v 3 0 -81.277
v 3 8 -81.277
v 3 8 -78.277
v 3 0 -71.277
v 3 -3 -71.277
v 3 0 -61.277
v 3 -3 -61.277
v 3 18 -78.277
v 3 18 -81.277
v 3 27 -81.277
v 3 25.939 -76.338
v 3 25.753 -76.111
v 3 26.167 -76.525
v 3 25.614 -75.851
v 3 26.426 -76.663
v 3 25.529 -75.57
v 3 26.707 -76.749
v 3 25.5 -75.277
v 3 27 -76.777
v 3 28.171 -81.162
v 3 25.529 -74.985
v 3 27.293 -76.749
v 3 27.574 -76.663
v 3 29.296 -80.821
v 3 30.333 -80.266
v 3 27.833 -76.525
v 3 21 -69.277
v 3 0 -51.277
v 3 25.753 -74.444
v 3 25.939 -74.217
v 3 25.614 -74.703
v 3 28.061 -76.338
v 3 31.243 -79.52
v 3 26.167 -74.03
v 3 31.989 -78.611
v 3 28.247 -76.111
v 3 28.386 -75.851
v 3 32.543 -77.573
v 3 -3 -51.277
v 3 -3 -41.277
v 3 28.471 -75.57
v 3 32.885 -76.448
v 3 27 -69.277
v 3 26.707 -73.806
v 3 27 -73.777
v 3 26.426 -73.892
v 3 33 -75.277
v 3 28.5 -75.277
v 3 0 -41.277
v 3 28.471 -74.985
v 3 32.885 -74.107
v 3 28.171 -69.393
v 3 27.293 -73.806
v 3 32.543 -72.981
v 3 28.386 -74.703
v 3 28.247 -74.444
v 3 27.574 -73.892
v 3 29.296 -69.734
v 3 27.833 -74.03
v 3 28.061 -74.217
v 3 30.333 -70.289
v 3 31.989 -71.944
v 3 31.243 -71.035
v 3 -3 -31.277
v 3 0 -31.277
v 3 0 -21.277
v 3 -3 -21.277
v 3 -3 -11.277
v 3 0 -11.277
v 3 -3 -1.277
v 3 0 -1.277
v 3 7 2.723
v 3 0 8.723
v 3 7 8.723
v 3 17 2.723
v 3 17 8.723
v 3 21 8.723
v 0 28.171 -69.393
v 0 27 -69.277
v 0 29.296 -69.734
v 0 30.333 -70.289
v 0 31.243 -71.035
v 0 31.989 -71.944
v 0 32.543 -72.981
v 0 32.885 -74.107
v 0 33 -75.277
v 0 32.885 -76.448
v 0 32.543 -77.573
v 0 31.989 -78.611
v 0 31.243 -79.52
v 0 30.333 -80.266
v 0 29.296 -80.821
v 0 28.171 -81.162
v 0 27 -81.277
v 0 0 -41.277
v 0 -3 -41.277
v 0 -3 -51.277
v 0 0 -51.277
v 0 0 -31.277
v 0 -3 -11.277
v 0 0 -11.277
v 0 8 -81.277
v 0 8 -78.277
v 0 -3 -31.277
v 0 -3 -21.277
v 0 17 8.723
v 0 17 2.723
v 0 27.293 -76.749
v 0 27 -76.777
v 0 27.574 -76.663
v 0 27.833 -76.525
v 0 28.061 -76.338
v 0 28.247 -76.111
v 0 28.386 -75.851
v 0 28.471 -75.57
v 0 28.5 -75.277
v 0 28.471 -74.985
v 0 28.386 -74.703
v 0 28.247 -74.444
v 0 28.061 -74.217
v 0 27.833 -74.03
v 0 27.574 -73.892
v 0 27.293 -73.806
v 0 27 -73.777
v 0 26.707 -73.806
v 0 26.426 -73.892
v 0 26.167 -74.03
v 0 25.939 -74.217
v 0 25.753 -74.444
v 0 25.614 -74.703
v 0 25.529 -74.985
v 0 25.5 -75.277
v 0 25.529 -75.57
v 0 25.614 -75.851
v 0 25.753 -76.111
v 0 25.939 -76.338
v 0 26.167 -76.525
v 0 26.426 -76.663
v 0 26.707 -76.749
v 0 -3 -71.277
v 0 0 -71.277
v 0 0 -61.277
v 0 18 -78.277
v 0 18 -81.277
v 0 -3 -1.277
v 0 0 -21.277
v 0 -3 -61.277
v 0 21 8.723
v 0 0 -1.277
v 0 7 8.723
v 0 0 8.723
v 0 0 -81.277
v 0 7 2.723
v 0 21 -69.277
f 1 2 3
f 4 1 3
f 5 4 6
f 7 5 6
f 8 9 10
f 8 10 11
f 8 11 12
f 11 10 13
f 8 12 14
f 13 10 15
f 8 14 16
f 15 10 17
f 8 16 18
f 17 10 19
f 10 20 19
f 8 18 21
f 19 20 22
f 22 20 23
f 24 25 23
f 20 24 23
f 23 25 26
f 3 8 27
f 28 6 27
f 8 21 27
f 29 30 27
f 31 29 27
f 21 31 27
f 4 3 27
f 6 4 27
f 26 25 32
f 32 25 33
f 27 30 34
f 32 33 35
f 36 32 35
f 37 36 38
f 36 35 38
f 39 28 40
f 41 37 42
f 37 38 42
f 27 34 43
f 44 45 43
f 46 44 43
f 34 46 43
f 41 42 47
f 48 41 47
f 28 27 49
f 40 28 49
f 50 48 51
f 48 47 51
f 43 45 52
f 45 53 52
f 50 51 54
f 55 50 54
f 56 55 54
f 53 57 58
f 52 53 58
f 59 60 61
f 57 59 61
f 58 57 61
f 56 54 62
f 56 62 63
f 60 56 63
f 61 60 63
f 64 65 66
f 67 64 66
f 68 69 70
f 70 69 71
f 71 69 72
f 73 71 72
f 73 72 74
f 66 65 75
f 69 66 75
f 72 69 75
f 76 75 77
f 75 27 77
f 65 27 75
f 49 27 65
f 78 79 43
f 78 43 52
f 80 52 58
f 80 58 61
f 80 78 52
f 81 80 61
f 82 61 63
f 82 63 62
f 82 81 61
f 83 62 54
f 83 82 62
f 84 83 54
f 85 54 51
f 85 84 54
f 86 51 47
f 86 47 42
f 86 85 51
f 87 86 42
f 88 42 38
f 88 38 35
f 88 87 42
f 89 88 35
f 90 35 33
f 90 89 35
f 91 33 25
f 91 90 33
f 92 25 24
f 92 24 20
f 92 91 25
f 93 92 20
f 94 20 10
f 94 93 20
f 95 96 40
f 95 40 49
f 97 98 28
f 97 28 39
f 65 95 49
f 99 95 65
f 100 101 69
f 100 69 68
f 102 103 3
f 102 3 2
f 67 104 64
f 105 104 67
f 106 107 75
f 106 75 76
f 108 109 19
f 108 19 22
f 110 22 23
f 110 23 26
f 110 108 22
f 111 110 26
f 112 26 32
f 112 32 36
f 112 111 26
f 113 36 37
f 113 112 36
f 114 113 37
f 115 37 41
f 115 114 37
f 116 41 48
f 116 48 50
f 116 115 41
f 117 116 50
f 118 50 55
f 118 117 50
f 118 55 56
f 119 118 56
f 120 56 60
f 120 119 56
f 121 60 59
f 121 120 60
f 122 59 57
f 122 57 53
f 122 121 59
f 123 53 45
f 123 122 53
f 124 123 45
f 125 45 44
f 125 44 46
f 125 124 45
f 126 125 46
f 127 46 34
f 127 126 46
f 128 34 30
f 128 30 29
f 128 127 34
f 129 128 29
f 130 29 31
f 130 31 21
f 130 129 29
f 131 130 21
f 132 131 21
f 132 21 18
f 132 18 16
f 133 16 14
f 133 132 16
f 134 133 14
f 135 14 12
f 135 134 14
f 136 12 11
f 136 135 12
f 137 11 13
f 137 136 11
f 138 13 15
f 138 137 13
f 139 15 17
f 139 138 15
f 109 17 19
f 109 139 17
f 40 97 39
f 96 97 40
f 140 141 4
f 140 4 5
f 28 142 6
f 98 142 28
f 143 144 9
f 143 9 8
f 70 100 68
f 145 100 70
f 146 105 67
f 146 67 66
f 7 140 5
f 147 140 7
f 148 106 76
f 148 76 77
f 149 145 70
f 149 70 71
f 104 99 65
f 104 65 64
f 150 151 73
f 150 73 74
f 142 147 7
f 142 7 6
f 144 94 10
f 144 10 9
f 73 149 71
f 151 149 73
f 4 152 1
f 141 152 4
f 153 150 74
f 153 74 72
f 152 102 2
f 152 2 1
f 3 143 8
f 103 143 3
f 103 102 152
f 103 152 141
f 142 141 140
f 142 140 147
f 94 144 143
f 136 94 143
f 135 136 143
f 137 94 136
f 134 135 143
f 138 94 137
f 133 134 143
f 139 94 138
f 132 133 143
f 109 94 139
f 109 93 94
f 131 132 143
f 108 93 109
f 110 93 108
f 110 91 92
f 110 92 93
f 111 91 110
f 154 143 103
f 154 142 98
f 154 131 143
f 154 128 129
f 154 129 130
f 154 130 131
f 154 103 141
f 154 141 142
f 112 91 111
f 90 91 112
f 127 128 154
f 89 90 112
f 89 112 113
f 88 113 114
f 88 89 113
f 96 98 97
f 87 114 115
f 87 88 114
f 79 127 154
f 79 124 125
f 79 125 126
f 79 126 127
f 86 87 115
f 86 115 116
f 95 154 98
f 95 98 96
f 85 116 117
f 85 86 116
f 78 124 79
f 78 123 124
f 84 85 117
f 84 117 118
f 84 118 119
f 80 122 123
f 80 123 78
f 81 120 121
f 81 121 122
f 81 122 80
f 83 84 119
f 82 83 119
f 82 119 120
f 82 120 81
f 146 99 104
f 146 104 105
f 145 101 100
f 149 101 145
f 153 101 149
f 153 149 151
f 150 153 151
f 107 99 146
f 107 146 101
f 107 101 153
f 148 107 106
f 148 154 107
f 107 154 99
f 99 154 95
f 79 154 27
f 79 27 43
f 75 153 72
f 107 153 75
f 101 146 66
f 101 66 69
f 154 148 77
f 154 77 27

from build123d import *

# Parameters (mm, degrees)
SKETCH1_R           = 1.5
BOSS_EXTRUDE1_DEPTH = 3


with BuildPart() as part:
    # Sketch1 → Boss-Extrude1 (new body)
    with BuildSketch(Plane(origin=(0, 0, 0), x_dir=(0, 0, -1), z_dir=(1, 0, 0))):
        with BuildLine():
            Line((81.277391257, 21), (81.277391257, 18))
            Line((81.277391257, 18), (78.277391257, 18))
            Line((78.277391257, 18), (78.277391257, 8))
            Line((78.277391257, 8), (81.277391257, 8))
            Line((81.277391257, 8), (81.277391257, 0))
            Line((81.277391257, 0), (71.277391257, 0))
            Line((71.277391257, 0), (71.277391257, -3))
            Line((71.277391257, -3), (61.277391257, -3))
            Line((61.277391257, -3), (61.277391257, 0))
            Line((61.277391257, 0), (51.277391257, 0))
            Line((51.277391257, 0), (51.277391257, -3))
            Line((51.277391257, -3), (41.277391257, -3))
            Line((41.277391257, -3), (41.277391257, 0))
            Line((41.277391257, 0), (31.277391257, 0))
            Line((31.277391257, 0), (31.277391257, -3))
            Line((31.277391257, -3), (21.277391257, -3))
            Line((21.277391257, -3), (21.277391257, 0))
            Line((21.277391257, 0), (11.277391257, 0))
            Line((11.277391257, 0), (11.277391257, -3))
            Line((11.277391257, -3), (1.277391257, -3))
            Line((1.277391257, -3), (1.277391257, 0))
            Line((1.277391257, 0), (-8.722608743, 0))
            Line((-8.722608743, 0), (-8.722608743, 7))
            Line((-8.722608743, 7), (-2.722608743, 7))
            Line((-2.722608743, 7), (-2.722608743, 17))
            Line((-2.722608743, 17), (-8.722608743, 17))
            Line((-8.722608743, 17), (-8.722608743, 21))
            Line((-8.722608743, 21), (69.277391257, 21))
            Line((69.277391257, 21), (69.277391257, 27))
            ThreePointArc((69.277391257, 27), (75.277391257, 33), (81.277391257, 27))
            Line((81.277391257, 27), (81.277391257, 21))
        make_face()
        with Locations((75.277391257, 27)):
            Circle(SKETCH1_R, mode=Mode.SUBTRACT)
    extrude(amount=BOSS_EXTRUDE1_DEPTH)


solid = part.part
